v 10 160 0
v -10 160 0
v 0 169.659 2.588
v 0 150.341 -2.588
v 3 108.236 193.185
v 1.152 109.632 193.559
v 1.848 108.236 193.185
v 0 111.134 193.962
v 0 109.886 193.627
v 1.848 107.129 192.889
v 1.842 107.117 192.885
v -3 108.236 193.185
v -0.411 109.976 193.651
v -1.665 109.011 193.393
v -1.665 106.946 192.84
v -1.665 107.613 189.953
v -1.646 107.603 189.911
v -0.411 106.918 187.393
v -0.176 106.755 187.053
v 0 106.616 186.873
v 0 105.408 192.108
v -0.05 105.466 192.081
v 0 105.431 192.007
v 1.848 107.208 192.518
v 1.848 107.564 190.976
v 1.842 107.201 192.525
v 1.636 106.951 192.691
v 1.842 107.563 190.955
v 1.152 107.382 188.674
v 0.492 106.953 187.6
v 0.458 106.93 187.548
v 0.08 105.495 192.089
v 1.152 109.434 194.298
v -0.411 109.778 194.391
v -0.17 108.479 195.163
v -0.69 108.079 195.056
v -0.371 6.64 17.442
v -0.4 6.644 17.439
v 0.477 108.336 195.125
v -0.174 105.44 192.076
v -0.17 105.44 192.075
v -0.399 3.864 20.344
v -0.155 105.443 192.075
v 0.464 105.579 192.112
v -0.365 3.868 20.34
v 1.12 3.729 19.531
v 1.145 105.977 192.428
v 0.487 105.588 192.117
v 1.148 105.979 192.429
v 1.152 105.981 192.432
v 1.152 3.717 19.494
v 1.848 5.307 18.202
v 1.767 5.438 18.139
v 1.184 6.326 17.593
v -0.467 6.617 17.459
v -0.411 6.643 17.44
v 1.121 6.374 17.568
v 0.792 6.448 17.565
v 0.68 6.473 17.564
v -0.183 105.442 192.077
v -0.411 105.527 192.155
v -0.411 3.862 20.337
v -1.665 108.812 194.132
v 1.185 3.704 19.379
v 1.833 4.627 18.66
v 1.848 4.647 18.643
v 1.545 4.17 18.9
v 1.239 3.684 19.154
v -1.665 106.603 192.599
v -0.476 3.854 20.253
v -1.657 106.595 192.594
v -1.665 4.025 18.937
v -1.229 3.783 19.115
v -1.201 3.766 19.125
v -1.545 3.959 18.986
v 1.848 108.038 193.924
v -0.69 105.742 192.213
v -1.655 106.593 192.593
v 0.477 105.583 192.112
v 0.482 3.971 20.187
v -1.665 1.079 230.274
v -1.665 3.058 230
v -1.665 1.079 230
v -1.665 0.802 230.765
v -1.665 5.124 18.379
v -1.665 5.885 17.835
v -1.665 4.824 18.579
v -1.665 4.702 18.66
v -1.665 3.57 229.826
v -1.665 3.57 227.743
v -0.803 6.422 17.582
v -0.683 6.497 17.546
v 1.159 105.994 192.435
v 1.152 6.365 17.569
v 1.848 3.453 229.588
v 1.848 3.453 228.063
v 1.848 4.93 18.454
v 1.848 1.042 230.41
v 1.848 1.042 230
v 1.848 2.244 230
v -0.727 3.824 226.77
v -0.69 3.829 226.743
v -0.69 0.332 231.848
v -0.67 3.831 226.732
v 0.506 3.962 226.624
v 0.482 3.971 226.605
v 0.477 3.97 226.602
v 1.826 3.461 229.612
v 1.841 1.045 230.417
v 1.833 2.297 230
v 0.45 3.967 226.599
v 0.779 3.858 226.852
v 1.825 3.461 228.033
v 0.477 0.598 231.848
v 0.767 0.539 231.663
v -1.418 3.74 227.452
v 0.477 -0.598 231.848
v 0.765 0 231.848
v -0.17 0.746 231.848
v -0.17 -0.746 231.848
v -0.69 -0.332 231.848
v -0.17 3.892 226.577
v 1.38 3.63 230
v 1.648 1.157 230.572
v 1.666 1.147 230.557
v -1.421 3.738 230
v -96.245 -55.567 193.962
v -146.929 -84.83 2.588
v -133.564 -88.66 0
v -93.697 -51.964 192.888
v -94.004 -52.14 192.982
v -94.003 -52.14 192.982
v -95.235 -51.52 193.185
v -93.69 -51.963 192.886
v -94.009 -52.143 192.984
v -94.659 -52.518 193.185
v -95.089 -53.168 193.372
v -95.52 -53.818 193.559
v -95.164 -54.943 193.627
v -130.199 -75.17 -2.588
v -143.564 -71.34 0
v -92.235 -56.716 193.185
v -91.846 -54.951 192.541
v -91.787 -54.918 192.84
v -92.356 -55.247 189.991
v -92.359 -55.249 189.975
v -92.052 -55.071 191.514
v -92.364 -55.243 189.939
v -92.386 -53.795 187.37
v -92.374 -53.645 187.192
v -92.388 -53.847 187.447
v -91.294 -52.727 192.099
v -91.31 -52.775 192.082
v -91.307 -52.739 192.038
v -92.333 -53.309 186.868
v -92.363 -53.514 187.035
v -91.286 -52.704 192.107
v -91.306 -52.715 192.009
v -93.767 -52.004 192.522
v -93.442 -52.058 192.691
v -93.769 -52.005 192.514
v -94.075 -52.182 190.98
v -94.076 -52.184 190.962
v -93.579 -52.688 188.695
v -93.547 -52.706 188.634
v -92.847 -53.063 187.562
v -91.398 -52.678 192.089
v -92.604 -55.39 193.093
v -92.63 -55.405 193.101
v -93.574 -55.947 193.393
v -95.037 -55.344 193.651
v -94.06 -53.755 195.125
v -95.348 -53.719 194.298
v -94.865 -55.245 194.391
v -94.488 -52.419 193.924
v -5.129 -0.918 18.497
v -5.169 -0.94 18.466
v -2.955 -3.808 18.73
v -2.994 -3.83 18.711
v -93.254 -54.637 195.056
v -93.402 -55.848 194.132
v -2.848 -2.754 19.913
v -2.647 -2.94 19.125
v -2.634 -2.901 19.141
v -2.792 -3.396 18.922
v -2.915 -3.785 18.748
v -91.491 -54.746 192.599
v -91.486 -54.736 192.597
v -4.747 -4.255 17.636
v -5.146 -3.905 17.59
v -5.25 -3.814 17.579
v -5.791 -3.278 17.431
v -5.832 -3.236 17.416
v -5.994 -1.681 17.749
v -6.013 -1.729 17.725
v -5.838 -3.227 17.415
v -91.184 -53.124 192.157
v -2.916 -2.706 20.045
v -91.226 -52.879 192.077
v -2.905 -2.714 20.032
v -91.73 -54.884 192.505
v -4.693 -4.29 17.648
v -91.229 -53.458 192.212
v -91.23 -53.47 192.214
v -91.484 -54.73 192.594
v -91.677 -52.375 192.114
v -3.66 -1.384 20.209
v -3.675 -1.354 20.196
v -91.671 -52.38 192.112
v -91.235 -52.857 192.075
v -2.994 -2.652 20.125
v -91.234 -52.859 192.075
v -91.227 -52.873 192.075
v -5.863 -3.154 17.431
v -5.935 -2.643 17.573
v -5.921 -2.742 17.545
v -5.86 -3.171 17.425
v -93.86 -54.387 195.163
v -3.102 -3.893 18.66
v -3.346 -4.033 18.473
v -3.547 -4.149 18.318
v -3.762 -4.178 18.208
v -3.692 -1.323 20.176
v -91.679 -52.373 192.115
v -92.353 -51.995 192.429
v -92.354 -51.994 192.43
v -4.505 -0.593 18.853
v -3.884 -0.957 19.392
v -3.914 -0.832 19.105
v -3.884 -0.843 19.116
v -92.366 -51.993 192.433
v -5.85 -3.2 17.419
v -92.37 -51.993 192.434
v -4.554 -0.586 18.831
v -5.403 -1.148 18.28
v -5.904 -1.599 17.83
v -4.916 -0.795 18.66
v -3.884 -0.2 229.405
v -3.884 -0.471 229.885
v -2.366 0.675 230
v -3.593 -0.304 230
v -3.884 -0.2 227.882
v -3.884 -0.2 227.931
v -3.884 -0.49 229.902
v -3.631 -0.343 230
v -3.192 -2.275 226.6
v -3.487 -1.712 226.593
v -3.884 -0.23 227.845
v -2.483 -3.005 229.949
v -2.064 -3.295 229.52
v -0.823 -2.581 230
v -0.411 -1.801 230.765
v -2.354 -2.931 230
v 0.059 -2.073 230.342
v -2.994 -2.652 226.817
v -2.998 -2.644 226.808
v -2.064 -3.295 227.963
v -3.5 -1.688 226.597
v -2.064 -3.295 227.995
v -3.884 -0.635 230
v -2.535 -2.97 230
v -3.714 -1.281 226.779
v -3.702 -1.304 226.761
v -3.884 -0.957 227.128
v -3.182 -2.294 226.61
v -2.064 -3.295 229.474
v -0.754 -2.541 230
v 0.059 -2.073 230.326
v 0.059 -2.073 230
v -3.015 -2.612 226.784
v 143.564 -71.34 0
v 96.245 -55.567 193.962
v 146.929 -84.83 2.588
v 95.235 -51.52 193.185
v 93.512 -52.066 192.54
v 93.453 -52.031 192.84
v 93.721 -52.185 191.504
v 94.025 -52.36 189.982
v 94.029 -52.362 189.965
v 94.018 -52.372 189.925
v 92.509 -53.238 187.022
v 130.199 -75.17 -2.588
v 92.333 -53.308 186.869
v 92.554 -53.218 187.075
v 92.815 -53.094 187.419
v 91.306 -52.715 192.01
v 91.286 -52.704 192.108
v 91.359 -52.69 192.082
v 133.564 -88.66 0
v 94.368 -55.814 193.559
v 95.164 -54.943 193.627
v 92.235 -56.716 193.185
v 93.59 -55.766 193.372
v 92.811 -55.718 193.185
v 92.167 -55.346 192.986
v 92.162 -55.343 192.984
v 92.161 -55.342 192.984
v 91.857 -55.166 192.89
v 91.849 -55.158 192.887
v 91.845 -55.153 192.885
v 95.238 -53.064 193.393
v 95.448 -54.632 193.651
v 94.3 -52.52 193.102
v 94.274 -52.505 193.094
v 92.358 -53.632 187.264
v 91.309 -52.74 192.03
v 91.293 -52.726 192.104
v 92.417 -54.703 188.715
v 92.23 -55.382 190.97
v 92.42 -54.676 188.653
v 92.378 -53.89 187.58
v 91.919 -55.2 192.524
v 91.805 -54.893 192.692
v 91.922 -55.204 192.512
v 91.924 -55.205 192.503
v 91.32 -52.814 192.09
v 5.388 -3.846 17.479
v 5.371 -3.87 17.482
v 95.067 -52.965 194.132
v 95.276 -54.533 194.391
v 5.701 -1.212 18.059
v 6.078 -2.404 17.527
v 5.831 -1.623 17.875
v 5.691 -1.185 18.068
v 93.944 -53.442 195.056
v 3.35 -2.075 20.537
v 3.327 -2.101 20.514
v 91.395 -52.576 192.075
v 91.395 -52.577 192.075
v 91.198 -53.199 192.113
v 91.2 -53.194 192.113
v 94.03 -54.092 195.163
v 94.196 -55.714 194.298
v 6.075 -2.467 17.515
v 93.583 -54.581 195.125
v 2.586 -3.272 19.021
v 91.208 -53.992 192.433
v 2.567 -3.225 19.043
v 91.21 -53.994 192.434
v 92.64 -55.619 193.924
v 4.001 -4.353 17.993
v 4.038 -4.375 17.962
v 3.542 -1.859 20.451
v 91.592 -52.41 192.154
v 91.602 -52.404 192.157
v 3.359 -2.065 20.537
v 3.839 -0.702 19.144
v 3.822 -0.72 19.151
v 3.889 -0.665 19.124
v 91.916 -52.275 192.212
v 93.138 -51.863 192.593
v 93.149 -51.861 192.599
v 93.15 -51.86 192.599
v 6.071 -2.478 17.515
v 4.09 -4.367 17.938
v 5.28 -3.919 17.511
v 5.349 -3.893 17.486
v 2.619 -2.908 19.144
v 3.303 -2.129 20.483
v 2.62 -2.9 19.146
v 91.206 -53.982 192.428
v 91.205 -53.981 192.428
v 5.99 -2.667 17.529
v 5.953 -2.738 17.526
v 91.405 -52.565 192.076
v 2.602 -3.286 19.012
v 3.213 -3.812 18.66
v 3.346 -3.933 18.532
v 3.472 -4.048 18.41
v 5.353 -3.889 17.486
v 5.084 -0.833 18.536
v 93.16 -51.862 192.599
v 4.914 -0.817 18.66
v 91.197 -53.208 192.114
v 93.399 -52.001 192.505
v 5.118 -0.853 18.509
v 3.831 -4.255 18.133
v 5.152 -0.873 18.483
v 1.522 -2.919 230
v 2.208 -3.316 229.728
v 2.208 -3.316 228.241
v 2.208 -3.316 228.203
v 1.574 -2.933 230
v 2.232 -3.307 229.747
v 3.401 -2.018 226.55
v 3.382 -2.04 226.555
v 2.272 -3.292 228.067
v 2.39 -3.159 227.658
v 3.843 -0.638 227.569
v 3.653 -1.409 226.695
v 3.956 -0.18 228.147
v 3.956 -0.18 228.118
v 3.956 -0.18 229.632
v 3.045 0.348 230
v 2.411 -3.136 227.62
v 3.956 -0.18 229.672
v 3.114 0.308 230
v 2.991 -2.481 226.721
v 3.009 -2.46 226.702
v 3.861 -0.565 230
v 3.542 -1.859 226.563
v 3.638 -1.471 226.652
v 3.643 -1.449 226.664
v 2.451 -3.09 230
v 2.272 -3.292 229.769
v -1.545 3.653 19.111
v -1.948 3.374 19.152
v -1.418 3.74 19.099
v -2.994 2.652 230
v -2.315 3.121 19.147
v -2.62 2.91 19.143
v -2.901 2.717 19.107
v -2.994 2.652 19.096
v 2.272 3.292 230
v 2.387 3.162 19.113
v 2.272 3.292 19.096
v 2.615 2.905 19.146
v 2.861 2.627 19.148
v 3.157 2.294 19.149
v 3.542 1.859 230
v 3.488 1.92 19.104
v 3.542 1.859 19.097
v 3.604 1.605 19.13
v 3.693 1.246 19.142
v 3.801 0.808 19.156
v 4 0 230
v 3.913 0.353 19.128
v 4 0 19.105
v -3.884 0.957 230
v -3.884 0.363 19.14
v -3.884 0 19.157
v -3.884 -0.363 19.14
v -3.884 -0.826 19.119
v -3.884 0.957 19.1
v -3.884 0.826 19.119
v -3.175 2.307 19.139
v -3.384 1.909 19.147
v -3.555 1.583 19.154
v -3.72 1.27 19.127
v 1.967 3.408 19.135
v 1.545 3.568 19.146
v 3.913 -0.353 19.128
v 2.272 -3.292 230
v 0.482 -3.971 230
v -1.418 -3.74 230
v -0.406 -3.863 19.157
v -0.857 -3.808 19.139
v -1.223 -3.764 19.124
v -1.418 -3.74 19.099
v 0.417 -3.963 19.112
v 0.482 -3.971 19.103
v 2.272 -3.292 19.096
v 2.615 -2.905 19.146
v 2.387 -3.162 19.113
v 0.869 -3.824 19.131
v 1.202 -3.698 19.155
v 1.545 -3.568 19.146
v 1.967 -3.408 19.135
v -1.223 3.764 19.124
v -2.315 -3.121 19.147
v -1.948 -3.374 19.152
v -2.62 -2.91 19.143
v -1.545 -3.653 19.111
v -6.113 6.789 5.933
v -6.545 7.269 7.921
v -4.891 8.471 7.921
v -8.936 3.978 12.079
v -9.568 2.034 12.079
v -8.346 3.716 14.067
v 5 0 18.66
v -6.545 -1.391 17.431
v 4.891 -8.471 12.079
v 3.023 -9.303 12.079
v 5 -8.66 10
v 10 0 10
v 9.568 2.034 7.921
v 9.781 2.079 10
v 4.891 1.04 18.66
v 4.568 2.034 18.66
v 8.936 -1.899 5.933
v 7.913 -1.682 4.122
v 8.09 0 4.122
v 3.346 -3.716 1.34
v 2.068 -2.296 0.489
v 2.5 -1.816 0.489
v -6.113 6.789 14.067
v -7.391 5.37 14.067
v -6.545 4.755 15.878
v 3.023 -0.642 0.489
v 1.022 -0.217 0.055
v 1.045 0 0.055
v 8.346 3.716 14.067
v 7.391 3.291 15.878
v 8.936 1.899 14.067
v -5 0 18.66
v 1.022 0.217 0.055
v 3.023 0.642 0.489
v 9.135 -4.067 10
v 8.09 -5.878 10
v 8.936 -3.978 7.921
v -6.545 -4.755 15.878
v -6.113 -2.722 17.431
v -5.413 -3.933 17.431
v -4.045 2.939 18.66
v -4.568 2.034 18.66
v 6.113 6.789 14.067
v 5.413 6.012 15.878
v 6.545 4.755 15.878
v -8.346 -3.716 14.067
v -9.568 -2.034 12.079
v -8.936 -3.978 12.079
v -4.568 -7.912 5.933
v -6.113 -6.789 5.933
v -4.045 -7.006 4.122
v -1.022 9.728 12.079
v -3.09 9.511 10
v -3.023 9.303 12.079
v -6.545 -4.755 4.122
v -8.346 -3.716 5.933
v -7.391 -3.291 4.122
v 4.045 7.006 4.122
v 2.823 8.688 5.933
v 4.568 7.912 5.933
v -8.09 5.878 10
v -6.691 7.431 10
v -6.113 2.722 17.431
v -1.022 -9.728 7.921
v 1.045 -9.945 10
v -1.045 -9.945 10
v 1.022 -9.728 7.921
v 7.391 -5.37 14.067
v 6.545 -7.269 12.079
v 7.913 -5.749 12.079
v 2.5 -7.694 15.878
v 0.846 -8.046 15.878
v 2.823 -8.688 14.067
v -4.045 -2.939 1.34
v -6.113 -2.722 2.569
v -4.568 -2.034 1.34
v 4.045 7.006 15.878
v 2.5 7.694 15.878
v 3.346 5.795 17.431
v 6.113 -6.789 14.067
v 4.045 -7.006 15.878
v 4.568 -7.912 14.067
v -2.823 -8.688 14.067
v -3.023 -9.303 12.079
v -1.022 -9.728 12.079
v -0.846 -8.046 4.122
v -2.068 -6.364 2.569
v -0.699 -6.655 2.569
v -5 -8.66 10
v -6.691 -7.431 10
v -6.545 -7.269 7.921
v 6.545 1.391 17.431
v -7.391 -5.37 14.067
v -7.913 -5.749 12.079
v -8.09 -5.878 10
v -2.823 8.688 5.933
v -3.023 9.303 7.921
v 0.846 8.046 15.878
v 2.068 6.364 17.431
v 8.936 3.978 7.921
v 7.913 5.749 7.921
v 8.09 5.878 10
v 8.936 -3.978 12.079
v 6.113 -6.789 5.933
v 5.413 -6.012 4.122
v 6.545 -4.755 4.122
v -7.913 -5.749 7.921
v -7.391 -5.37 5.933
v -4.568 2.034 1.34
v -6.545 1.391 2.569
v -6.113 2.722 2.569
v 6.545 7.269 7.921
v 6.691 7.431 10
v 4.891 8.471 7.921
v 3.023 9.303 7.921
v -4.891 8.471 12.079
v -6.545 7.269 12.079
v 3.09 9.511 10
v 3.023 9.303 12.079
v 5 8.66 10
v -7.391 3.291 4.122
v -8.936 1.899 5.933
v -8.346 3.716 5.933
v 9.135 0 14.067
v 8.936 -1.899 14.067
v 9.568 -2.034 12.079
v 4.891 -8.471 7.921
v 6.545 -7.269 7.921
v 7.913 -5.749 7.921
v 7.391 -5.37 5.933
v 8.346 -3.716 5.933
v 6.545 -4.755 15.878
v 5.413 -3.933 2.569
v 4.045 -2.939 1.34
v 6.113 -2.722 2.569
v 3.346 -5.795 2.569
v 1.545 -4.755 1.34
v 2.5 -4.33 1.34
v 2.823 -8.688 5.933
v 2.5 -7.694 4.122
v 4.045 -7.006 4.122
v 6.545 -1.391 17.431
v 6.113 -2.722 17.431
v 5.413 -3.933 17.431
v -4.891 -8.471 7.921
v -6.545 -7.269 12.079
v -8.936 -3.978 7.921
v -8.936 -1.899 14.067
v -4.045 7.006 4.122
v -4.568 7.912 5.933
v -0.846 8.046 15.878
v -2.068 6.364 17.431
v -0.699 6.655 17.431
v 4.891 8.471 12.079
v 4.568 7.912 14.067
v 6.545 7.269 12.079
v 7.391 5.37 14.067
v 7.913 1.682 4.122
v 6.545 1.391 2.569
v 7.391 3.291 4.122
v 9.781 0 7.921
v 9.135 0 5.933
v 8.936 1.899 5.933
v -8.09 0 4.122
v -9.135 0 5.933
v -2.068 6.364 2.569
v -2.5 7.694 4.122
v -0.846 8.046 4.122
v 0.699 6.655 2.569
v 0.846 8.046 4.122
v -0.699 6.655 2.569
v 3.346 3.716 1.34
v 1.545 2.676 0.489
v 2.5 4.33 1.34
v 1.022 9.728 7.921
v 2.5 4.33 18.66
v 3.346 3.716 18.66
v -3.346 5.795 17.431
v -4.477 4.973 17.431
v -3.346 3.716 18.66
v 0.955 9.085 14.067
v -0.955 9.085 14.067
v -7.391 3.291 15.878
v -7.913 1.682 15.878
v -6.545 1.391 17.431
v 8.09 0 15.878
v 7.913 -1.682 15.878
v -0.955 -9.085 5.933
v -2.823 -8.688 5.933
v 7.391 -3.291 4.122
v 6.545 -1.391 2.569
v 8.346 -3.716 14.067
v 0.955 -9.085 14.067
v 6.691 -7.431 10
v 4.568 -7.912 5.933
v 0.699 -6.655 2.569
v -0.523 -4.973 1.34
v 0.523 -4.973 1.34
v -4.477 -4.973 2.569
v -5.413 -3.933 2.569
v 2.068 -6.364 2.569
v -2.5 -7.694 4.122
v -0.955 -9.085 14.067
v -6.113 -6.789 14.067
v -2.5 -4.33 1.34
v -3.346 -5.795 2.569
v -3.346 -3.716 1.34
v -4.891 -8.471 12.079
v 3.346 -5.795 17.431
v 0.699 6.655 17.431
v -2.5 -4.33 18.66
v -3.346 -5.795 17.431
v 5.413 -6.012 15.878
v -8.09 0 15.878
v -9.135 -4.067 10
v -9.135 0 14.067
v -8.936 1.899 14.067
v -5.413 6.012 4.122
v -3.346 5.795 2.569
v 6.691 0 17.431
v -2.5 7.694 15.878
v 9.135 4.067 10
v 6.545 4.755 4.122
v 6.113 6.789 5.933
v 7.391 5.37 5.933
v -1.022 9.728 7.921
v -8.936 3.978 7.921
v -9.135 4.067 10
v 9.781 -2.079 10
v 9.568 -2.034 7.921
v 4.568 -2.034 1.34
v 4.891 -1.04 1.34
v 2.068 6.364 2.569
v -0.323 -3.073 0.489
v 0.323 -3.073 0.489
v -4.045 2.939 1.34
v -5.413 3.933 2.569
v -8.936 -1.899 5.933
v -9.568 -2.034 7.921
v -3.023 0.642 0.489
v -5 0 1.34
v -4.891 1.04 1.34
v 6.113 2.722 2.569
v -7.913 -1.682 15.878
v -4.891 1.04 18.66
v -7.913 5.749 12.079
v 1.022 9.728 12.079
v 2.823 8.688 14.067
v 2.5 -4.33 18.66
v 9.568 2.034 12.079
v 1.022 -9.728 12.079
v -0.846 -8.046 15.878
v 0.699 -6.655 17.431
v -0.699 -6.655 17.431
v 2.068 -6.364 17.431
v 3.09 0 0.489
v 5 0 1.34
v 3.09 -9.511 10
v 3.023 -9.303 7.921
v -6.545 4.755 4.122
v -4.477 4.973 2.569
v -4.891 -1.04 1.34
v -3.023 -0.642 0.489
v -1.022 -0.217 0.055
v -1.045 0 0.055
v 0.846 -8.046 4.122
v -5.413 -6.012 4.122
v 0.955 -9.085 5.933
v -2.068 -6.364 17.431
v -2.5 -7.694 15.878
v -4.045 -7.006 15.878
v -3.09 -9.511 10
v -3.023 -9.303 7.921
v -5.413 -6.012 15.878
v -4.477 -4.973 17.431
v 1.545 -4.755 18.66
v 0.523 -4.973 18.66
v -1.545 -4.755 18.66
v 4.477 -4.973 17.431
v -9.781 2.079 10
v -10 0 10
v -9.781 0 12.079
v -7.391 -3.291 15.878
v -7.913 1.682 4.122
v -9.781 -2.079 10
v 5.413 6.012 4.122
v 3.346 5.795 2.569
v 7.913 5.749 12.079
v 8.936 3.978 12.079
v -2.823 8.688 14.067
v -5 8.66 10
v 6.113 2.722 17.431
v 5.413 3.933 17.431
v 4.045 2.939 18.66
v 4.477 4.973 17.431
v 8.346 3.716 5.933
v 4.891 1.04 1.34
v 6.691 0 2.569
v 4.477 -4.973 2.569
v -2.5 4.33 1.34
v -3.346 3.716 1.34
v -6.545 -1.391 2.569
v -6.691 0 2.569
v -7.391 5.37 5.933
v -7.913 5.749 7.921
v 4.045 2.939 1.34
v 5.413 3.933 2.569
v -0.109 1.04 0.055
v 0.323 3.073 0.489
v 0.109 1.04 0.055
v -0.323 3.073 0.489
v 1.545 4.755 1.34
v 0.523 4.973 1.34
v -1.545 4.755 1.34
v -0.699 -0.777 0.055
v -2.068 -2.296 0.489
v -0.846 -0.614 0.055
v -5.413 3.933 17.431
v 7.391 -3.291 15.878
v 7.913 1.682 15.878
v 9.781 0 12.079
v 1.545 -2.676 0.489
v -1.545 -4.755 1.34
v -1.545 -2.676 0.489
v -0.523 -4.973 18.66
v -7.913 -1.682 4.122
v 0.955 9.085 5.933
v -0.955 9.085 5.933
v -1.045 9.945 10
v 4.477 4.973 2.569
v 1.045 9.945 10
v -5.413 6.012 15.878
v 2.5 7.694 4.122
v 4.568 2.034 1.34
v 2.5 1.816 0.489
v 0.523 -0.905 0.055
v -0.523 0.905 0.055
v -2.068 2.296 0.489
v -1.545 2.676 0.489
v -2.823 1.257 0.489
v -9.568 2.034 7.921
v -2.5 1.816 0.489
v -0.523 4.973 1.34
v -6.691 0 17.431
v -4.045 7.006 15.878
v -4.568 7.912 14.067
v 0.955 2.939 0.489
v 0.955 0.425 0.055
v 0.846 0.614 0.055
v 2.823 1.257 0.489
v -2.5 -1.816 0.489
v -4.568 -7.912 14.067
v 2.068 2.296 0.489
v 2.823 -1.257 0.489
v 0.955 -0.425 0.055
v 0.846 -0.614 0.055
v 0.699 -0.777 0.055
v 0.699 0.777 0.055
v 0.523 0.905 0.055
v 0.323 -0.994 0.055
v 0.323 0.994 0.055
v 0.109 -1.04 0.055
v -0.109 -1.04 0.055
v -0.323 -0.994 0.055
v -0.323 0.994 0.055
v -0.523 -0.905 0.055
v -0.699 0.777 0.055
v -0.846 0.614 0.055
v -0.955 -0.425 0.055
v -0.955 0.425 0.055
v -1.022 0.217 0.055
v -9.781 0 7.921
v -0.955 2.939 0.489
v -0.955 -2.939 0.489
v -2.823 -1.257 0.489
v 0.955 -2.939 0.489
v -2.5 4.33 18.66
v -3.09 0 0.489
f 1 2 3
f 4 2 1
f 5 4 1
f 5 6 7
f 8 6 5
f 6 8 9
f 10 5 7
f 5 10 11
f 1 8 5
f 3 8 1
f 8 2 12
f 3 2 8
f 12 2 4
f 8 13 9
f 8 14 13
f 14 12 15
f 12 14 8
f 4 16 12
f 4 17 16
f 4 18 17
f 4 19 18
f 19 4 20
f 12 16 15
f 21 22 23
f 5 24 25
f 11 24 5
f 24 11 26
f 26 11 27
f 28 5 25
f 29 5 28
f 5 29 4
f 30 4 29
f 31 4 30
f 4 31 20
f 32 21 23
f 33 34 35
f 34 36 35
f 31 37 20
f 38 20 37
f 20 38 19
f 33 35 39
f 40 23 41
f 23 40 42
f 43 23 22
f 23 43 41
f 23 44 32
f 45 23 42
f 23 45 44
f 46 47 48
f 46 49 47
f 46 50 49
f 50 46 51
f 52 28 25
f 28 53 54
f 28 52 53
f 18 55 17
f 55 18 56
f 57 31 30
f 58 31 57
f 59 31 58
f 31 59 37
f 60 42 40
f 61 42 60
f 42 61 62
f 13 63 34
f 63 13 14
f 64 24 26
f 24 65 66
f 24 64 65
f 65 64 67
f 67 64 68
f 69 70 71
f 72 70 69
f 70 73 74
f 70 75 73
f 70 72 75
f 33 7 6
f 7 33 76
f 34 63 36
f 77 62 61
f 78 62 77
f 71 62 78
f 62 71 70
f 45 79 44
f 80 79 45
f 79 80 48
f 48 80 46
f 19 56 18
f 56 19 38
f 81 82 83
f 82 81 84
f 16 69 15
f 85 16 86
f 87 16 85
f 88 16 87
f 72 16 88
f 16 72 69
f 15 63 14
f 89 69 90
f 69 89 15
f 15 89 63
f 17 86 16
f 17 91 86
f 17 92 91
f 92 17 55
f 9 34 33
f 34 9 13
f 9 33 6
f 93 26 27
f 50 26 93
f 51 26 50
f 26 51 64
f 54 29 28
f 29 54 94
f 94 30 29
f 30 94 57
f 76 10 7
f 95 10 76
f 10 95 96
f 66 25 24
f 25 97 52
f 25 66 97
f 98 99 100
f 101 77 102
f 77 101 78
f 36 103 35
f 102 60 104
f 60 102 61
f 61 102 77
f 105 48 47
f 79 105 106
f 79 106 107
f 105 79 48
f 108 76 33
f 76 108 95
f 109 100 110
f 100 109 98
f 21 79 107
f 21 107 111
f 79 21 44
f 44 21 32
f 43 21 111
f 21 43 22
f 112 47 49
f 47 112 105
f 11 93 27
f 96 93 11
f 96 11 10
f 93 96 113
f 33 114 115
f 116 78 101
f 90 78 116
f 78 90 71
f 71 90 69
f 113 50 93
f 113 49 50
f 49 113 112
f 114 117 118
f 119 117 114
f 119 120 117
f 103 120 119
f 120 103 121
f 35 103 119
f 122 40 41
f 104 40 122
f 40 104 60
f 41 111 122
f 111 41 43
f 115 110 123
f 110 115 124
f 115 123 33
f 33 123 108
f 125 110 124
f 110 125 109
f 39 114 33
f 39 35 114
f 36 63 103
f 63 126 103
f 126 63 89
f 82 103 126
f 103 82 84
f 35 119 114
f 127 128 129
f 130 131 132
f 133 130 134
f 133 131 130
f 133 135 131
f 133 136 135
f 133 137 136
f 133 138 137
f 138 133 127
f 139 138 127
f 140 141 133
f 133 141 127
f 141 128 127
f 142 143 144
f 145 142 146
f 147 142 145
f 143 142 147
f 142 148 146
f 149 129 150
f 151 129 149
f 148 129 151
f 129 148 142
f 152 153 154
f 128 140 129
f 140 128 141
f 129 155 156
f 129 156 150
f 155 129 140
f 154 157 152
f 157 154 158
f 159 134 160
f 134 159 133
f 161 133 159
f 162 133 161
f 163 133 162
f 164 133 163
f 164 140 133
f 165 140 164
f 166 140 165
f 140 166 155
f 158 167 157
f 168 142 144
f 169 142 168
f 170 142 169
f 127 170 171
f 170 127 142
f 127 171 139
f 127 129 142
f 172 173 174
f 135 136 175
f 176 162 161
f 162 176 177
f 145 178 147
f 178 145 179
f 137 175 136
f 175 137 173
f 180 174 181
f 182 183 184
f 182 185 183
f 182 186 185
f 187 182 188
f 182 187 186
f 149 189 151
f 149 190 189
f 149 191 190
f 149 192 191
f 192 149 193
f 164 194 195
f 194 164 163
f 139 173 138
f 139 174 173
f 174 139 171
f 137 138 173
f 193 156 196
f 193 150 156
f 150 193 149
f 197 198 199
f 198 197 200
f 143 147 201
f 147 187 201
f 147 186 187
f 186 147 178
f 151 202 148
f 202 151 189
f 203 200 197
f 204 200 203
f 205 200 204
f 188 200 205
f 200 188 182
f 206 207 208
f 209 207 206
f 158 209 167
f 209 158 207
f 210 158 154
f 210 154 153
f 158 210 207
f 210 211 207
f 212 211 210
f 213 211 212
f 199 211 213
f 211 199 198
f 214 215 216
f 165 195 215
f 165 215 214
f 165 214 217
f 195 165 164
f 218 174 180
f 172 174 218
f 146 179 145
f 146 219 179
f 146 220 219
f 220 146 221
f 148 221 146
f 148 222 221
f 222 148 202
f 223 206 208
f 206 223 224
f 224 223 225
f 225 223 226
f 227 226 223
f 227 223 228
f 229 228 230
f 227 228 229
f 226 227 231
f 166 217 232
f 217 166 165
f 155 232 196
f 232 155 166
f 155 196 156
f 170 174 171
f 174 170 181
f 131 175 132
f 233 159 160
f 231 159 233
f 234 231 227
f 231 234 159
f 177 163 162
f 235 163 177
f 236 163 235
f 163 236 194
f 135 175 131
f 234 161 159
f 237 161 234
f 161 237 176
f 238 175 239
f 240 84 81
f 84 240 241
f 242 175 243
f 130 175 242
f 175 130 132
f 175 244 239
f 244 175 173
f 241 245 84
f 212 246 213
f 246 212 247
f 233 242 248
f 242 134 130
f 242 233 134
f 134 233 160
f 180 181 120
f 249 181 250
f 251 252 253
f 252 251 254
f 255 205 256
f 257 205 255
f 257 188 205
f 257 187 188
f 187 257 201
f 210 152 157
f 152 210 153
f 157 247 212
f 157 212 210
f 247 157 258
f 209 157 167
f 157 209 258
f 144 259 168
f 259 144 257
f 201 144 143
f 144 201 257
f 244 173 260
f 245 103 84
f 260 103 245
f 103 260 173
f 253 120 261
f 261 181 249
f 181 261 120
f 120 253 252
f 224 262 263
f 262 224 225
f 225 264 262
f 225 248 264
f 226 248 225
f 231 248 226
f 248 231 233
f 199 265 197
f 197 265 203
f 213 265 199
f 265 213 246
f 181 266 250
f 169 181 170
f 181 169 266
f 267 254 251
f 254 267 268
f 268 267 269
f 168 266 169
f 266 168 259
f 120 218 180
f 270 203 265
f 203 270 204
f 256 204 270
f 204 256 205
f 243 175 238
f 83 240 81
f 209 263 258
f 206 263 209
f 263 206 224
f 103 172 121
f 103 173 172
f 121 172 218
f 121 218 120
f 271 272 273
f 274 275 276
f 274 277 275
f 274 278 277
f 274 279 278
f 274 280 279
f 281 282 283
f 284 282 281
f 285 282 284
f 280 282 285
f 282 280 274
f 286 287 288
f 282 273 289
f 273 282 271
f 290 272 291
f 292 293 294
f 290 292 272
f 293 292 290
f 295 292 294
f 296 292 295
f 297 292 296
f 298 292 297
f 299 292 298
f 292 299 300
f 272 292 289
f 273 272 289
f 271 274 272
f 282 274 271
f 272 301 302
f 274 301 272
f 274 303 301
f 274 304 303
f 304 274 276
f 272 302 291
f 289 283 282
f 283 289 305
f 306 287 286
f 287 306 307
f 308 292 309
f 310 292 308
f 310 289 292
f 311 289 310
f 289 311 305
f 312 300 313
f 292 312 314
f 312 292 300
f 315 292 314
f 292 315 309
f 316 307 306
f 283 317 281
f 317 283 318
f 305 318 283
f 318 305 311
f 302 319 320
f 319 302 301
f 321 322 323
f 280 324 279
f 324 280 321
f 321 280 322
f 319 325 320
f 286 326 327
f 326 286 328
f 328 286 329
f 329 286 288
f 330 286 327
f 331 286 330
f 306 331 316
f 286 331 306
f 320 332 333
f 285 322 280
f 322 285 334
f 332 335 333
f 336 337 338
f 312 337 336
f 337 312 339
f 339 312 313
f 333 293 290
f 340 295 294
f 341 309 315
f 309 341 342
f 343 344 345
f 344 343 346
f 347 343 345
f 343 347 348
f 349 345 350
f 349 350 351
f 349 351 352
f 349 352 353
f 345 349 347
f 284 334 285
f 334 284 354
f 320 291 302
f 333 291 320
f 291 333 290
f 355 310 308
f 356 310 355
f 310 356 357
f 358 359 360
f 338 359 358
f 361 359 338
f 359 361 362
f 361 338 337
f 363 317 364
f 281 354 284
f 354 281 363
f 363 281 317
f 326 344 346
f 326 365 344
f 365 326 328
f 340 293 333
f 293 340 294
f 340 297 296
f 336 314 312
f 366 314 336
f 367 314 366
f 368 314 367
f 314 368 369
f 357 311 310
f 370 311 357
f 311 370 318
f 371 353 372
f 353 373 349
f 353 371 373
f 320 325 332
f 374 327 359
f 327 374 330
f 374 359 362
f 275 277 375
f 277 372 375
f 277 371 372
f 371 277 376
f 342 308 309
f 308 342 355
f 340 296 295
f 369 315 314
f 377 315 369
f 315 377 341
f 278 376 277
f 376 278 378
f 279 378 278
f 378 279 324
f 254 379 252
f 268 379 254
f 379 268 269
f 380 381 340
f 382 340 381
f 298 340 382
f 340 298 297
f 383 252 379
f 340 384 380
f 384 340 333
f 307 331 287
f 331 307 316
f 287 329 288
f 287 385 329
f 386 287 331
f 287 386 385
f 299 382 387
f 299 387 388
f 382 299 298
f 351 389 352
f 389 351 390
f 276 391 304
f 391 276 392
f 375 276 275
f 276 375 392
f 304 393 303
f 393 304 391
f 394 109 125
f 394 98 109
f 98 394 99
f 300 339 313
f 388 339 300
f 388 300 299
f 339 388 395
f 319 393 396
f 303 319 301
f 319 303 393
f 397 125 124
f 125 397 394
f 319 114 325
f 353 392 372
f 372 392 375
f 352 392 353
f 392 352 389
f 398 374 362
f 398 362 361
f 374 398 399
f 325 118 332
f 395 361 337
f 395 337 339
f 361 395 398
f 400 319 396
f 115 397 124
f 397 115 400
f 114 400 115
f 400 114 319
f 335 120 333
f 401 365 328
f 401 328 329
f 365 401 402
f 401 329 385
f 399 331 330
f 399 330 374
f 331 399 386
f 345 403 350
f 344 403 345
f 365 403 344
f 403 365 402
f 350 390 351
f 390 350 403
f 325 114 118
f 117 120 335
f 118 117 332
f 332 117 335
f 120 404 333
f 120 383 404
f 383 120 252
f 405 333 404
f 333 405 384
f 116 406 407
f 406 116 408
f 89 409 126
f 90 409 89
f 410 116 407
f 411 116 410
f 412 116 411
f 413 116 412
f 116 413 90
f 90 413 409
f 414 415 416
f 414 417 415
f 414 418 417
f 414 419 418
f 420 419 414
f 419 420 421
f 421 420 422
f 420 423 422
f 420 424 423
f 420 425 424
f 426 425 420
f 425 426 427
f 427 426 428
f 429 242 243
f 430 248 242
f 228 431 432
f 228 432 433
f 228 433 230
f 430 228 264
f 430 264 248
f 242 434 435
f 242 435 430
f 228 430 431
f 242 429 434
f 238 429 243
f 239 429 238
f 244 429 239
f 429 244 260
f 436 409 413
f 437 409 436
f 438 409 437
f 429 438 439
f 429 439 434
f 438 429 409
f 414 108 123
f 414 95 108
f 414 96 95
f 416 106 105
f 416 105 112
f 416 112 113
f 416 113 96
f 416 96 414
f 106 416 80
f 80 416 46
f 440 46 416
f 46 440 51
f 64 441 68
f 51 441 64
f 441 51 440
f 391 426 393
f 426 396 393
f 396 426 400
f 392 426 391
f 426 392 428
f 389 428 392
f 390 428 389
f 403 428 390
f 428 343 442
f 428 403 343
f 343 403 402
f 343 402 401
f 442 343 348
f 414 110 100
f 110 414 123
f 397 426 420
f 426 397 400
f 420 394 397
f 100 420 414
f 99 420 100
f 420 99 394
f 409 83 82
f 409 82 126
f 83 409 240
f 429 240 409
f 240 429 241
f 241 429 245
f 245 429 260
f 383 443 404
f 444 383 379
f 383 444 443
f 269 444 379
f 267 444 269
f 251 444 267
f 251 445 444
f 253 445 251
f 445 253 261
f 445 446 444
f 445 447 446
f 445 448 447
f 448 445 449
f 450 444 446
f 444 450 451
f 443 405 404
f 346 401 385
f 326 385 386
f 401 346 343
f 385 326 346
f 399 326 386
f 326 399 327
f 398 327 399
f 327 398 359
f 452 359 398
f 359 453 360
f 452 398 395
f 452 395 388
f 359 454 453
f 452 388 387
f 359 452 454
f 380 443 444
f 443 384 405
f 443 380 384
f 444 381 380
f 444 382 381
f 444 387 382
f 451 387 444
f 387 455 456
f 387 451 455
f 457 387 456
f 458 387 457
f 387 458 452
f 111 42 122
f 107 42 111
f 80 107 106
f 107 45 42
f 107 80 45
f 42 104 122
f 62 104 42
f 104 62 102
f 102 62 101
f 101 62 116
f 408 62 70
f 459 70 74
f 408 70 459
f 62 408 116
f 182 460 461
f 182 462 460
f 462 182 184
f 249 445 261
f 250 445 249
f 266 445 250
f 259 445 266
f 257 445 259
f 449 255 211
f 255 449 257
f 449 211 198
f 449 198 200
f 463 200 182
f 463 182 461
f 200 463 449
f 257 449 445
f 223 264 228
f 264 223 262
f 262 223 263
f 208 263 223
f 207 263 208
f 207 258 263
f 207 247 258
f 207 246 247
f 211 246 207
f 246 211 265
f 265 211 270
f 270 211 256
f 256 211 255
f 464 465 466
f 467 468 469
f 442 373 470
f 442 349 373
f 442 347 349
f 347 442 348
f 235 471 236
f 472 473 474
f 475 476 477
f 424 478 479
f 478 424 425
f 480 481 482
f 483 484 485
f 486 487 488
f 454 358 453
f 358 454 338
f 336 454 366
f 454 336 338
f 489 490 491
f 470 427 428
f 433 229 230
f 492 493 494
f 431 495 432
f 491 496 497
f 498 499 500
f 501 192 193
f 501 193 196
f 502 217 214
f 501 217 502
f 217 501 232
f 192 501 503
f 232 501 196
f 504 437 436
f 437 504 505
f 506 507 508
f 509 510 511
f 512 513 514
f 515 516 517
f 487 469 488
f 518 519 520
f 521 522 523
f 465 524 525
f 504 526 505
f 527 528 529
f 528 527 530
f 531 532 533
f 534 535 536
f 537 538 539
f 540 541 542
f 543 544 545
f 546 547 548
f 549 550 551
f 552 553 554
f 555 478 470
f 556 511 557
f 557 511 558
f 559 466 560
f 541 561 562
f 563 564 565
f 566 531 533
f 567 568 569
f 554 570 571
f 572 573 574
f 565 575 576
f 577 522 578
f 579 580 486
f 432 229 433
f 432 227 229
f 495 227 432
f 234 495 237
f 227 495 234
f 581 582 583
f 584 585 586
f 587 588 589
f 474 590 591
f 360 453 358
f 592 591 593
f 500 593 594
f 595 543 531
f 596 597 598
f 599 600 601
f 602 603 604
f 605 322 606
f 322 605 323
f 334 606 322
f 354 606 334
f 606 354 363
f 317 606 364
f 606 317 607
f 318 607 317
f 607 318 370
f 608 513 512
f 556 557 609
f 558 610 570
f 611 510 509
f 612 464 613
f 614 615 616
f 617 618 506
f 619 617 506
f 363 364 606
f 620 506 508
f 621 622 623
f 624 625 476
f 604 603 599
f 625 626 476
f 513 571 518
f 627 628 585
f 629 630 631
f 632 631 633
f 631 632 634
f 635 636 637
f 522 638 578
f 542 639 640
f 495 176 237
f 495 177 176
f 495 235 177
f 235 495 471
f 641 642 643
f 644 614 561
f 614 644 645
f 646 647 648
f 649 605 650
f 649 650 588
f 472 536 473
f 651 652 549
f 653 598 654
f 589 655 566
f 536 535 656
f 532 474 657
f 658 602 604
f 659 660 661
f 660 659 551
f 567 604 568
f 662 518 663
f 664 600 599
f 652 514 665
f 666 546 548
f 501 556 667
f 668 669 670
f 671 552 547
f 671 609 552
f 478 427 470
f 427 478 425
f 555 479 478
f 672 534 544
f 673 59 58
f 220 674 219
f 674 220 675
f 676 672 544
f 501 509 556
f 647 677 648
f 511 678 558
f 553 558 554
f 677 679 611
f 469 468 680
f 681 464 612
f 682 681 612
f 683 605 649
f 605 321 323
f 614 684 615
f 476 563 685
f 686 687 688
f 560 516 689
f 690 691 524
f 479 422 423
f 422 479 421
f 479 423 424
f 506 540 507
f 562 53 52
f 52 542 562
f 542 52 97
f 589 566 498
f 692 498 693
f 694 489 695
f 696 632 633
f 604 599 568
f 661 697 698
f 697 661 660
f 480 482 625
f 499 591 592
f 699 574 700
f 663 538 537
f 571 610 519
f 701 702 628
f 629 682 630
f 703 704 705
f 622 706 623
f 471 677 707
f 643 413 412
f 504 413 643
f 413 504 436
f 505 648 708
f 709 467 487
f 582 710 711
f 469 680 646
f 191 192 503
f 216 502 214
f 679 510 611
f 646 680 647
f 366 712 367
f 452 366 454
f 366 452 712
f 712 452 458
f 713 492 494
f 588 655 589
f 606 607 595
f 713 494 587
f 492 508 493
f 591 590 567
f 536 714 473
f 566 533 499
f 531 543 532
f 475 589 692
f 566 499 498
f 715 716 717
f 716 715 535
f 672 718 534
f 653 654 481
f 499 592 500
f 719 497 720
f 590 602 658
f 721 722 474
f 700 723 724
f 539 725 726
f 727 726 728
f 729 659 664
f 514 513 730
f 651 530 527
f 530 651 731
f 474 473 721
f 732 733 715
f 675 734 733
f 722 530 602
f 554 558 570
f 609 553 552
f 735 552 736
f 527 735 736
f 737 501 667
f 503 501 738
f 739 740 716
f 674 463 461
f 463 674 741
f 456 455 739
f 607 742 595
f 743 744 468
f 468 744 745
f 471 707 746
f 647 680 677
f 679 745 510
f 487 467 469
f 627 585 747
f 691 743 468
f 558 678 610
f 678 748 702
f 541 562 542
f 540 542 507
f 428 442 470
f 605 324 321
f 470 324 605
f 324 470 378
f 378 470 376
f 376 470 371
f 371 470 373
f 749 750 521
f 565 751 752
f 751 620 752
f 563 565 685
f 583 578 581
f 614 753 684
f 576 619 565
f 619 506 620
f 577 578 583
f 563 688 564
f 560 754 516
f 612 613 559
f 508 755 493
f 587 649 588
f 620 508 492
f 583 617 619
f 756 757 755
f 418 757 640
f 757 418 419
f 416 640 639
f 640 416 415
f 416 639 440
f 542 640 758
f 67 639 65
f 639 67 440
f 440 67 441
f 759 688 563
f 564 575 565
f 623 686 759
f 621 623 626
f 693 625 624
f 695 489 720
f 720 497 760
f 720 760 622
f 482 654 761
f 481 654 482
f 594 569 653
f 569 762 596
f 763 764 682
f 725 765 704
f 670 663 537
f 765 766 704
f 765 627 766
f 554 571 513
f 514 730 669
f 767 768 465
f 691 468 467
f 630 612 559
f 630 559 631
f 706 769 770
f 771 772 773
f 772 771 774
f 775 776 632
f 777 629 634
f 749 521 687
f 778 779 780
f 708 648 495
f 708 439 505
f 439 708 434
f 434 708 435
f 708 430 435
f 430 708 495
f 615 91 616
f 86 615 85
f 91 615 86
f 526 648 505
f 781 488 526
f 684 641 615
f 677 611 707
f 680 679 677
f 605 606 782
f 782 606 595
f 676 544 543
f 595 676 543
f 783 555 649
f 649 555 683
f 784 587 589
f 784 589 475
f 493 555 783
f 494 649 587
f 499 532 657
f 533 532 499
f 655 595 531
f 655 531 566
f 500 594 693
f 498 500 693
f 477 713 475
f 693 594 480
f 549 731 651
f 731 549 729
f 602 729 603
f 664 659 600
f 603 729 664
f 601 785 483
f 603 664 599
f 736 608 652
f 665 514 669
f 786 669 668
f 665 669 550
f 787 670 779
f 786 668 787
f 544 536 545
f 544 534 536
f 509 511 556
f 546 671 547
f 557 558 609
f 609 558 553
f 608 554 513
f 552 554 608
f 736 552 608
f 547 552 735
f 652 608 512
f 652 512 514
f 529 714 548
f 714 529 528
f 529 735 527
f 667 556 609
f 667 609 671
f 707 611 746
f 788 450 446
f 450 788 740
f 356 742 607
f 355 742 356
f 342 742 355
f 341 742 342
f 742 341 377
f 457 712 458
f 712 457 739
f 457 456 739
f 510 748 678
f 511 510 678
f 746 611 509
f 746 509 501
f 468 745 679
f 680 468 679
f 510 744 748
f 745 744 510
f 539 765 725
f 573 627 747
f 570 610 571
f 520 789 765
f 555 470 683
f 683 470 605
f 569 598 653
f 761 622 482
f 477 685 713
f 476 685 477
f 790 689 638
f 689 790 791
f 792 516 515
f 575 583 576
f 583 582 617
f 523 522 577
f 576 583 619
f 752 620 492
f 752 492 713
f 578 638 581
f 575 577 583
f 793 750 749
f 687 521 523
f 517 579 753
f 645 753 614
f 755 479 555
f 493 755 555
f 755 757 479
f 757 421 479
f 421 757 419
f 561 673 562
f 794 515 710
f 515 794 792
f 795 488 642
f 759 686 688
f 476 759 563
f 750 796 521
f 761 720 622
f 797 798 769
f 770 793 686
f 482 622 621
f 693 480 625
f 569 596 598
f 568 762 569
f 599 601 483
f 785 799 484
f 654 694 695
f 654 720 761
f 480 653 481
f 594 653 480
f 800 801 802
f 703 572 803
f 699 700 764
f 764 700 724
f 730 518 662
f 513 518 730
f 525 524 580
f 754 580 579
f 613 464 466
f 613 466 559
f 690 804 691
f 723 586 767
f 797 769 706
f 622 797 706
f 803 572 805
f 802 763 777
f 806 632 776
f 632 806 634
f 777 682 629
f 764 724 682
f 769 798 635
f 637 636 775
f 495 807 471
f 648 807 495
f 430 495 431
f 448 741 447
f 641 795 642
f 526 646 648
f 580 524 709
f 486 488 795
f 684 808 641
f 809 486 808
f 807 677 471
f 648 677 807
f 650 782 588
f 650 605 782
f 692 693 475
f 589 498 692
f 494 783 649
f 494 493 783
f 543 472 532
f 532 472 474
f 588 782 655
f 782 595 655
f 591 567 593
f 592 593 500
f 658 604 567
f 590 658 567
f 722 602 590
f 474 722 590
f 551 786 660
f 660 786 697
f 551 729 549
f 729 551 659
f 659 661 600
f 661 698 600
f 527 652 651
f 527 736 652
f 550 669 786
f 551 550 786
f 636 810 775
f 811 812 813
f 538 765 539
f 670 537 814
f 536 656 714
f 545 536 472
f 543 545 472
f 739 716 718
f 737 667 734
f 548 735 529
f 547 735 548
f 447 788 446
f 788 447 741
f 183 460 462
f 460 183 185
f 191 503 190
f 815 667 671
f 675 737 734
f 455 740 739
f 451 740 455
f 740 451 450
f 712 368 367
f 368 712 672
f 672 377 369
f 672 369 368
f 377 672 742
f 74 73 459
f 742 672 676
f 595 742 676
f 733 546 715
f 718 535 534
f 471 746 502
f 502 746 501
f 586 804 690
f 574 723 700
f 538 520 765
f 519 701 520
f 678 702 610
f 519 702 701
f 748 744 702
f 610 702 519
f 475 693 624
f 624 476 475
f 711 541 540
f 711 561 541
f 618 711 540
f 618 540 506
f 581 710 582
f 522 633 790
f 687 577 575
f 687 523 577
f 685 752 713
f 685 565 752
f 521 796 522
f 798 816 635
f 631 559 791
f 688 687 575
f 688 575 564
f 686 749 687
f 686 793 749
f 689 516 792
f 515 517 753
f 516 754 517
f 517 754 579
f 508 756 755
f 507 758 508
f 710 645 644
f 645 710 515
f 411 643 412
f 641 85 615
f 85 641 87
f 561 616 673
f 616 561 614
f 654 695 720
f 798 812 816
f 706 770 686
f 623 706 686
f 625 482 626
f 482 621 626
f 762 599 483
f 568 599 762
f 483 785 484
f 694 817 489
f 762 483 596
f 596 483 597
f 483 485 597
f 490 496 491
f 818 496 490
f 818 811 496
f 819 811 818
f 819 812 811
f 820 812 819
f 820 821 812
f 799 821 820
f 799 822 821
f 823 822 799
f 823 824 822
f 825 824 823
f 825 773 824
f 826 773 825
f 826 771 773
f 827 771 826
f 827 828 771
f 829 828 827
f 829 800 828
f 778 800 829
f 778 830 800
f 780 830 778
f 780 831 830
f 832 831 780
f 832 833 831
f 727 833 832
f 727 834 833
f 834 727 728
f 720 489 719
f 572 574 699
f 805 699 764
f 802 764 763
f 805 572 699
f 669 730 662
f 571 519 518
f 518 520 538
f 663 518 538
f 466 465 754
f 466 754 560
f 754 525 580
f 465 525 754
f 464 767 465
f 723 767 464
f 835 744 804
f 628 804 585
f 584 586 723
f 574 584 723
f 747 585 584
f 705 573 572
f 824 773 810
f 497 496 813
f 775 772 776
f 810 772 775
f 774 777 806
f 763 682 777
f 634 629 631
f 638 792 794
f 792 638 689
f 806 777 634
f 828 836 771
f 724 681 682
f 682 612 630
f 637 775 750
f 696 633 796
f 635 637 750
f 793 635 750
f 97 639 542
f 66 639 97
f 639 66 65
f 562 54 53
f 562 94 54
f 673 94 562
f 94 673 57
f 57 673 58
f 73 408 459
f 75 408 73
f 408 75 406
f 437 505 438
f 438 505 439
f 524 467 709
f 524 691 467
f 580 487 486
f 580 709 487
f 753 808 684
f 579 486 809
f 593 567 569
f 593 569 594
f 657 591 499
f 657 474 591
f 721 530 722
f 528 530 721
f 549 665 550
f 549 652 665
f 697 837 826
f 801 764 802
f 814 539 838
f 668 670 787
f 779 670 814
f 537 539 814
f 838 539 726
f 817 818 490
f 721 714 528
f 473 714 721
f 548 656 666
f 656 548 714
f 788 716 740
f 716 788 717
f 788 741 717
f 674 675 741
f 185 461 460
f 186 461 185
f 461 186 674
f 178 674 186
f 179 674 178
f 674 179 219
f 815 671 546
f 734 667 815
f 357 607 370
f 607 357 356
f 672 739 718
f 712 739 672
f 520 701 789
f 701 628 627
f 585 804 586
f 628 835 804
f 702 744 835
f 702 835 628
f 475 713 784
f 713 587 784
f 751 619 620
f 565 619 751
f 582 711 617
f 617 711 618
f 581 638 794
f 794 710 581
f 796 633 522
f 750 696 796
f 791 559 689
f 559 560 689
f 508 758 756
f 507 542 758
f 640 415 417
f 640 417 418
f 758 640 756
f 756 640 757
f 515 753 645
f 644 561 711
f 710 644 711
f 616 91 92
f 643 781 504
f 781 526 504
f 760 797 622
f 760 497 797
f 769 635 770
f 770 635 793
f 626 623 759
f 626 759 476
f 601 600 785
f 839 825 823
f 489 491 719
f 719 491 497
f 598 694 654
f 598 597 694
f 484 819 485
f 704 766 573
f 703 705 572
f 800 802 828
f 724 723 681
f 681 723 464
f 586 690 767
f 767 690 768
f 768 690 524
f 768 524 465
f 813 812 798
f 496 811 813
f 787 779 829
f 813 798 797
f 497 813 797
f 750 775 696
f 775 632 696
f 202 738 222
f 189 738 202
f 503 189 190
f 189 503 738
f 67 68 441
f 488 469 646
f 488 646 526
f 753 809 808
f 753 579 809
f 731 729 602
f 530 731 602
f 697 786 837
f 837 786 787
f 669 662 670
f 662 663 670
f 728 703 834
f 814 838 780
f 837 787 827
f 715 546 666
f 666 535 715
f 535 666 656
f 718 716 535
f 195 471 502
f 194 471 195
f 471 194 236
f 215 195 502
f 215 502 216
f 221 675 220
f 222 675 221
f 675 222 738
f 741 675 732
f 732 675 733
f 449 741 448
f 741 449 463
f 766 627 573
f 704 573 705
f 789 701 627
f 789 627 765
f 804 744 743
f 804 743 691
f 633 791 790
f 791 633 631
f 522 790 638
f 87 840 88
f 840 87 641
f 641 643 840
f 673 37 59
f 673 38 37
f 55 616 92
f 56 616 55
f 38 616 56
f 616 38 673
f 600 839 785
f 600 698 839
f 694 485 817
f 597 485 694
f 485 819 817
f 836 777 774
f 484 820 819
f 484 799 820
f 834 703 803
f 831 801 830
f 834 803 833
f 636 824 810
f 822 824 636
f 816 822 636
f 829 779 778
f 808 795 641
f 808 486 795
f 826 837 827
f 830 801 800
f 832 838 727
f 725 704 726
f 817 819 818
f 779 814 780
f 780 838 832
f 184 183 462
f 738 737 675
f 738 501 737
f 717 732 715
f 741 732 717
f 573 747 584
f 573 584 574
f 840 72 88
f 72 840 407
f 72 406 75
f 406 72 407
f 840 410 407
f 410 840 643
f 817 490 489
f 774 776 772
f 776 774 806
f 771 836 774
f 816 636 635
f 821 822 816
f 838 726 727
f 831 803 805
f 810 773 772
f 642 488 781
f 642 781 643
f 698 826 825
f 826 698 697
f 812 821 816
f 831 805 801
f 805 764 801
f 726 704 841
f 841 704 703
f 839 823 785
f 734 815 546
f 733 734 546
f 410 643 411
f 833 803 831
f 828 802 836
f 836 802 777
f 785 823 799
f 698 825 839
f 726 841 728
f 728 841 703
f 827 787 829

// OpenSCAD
/**
 * From https://www.instructables.com/id/Animating-with-OpenSCAD/
 * Start animation, 20 FPS, 360 steps.
 */
//Variable describing the cranes
//The height of the crane units are whatever could be feet
crane_h = 200;
//Distance from center to the base from each crane
crane_r = 160;
//Size of the base of the crane
crane_b = 10;

//Degrees of tilt
crane_tilt = 15;

//Cable radius.  Big enough to see. 2 foot is ridiculous
cable_r = 2;

//Radius of the effector. Once again big enough to see
eff_r = 10;

//Height of the rod
rod_l = 220;
//Radius of rod. Once again big enough to see
rod_r = 4;

/*
* This array represents x,y,z locations that the crane
* moves to.  Note that the array is doubly indexed.  So that creates
* an array of vectors. Which are themselves an array of three
*/
loc = [
    [0,0,10],
    [50,50,10],
    [-50,50,50],
    [-50,-50,10],
    [40,-40,30],
    [40,40,10],
    [50,0,40],
    [0,0,10]
      ];


/*
* This is the secret sauce.  The lookup function does interpolations
* between entries.  A lookup table has a series of keys and values.
* The keys must be monotonic. That is they all increase in value from
* one to the next or they all decrease in value.  Then when a key is
* passed that is in between two key values.  The lookup function
* interpolates between the two.
*
* The key values are given values from 0 to 1 by dividing by the 
* len of the array of vectors.  This makes the keys represent
* possible values of $t.  The values are points in the loc array.
*
* The lookup table can have variables as values.  So we effectively
* have three lookup tables. See below for example with constants.
*
* 
*/
function xyz(t,i) = 
    lookup(t, [
        [0/len(loc),loc[0][i]],
        [1/len(loc),loc[1][i]],
        [2/len(loc),loc[2][i]],
        [3/len(loc),loc[3][i]],
        [4/len(loc),loc[4][i]],
        [5/len(loc),loc[5][i]],
        [6/len(loc),loc[6][i]],
        [7/len(loc),loc[7][i]],
    ]);

/*
* This is the actual way I wrote this function.  I rewrote it in the
* above way because I thought it might be clearer what is happening
*/
//function xyz(t,i) = 
//  lookup(len(loc)*t, [
//  [0,loc[0][i]],
//  [1,loc[1][i]],
//  [2,loc[2][i]],
//  [3,loc[3][i]],
//  [4,loc[4][i]],
//  [5,loc[5][i]],
//  [6,loc[6][i]],
//  [7,loc[7][i]],
//
//]);
//

/*
* I am showing these as an example of one variable in the lookup
* table.  This approach is fine if one has one variable or several
* unrelated variables.  Because x,y, and z represent points that the
* effector is being moved to, the array approach is easier to make
* changes to the path.
*
* The cranes module would be called like this.
* cranes(X($t),Y($t),Z($t));
*/
function X(t) = 
    lookup(t, [
    [0/len(loc),0],
    [1/len(loc),50],
    [2/len(loc),-50],
    [3/len(loc),-50],
    [4/len(loc),40],
    [5/len(loc),40],
    [6/len(loc),50],
    [7/len(loc),0],

]);function Y(t) = 
    lookup(t, [
    [0/len(loc),0],
    [1/len(loc),50],
    [2/len(loc),50],
    [3/len(loc),-50],
    [4/len(loc),-40],
    [5/len(loc),40],
    [6/len(loc),0],
    [7/len(loc),0],

]);function Z(t) = 
    lookup(t, [
    [0/len(loc),10],
    [1/len(loc),10],
    [2/len(loc),50],
    [3/len(loc),10],
    [4/len(loc),30],
    [5/len(loc),10],
    [6/len(loc),40],
    [7/len(loc),10],

]);

//Call the main module with variables that depend on $t
cranes(xyz($t,0),xyz($t,1),xyz($t,2));


module cranes(x,y,z)
{
    //Create three cranes and cables 120 degrees apart
    for(i=[0:120:359])
    {
        rotate([0,0,i])
        translate([0,crane_r,0])
        crane();
        //Create the cable going down to the effector
        cable(i,x,y,z);
        //Create the cable going to the top of the rod.
        cable(i,x,y,z+rod_l);
    }
    //Create the rod
    color("brown")
    translate([x,y,z])
    cylinder(r=rod_r,h=rod_l,center=false);
    //Create the effector
    color("red")
    translate([x,y,z])
    sphere(eff_r);
}

/*
* Tricky way to make a cable.  We hull between a cable sized
* sphere at the top of the crane and one at the x,y,z location
* of the other end (effector or top of rod).
*/
module cable(ang,x,y,z)
{
    color("silver")
    hull()
    {
        rotate([0,0,ang])
        translate([0,crane_r,0])
        rotate([crane_tilt,0,0])
        translate([0,0,crane_h])
        sphere(cable_r);
        translate([x,y,z])
        sphere(cable_r);
    }
}

//Simple crane
module crane()
{
    color("black")
    rotate([crane_tilt,0,0])
    cylinder(r1=crane_b,r2=3,h=crane_h,$fn=4);
}
